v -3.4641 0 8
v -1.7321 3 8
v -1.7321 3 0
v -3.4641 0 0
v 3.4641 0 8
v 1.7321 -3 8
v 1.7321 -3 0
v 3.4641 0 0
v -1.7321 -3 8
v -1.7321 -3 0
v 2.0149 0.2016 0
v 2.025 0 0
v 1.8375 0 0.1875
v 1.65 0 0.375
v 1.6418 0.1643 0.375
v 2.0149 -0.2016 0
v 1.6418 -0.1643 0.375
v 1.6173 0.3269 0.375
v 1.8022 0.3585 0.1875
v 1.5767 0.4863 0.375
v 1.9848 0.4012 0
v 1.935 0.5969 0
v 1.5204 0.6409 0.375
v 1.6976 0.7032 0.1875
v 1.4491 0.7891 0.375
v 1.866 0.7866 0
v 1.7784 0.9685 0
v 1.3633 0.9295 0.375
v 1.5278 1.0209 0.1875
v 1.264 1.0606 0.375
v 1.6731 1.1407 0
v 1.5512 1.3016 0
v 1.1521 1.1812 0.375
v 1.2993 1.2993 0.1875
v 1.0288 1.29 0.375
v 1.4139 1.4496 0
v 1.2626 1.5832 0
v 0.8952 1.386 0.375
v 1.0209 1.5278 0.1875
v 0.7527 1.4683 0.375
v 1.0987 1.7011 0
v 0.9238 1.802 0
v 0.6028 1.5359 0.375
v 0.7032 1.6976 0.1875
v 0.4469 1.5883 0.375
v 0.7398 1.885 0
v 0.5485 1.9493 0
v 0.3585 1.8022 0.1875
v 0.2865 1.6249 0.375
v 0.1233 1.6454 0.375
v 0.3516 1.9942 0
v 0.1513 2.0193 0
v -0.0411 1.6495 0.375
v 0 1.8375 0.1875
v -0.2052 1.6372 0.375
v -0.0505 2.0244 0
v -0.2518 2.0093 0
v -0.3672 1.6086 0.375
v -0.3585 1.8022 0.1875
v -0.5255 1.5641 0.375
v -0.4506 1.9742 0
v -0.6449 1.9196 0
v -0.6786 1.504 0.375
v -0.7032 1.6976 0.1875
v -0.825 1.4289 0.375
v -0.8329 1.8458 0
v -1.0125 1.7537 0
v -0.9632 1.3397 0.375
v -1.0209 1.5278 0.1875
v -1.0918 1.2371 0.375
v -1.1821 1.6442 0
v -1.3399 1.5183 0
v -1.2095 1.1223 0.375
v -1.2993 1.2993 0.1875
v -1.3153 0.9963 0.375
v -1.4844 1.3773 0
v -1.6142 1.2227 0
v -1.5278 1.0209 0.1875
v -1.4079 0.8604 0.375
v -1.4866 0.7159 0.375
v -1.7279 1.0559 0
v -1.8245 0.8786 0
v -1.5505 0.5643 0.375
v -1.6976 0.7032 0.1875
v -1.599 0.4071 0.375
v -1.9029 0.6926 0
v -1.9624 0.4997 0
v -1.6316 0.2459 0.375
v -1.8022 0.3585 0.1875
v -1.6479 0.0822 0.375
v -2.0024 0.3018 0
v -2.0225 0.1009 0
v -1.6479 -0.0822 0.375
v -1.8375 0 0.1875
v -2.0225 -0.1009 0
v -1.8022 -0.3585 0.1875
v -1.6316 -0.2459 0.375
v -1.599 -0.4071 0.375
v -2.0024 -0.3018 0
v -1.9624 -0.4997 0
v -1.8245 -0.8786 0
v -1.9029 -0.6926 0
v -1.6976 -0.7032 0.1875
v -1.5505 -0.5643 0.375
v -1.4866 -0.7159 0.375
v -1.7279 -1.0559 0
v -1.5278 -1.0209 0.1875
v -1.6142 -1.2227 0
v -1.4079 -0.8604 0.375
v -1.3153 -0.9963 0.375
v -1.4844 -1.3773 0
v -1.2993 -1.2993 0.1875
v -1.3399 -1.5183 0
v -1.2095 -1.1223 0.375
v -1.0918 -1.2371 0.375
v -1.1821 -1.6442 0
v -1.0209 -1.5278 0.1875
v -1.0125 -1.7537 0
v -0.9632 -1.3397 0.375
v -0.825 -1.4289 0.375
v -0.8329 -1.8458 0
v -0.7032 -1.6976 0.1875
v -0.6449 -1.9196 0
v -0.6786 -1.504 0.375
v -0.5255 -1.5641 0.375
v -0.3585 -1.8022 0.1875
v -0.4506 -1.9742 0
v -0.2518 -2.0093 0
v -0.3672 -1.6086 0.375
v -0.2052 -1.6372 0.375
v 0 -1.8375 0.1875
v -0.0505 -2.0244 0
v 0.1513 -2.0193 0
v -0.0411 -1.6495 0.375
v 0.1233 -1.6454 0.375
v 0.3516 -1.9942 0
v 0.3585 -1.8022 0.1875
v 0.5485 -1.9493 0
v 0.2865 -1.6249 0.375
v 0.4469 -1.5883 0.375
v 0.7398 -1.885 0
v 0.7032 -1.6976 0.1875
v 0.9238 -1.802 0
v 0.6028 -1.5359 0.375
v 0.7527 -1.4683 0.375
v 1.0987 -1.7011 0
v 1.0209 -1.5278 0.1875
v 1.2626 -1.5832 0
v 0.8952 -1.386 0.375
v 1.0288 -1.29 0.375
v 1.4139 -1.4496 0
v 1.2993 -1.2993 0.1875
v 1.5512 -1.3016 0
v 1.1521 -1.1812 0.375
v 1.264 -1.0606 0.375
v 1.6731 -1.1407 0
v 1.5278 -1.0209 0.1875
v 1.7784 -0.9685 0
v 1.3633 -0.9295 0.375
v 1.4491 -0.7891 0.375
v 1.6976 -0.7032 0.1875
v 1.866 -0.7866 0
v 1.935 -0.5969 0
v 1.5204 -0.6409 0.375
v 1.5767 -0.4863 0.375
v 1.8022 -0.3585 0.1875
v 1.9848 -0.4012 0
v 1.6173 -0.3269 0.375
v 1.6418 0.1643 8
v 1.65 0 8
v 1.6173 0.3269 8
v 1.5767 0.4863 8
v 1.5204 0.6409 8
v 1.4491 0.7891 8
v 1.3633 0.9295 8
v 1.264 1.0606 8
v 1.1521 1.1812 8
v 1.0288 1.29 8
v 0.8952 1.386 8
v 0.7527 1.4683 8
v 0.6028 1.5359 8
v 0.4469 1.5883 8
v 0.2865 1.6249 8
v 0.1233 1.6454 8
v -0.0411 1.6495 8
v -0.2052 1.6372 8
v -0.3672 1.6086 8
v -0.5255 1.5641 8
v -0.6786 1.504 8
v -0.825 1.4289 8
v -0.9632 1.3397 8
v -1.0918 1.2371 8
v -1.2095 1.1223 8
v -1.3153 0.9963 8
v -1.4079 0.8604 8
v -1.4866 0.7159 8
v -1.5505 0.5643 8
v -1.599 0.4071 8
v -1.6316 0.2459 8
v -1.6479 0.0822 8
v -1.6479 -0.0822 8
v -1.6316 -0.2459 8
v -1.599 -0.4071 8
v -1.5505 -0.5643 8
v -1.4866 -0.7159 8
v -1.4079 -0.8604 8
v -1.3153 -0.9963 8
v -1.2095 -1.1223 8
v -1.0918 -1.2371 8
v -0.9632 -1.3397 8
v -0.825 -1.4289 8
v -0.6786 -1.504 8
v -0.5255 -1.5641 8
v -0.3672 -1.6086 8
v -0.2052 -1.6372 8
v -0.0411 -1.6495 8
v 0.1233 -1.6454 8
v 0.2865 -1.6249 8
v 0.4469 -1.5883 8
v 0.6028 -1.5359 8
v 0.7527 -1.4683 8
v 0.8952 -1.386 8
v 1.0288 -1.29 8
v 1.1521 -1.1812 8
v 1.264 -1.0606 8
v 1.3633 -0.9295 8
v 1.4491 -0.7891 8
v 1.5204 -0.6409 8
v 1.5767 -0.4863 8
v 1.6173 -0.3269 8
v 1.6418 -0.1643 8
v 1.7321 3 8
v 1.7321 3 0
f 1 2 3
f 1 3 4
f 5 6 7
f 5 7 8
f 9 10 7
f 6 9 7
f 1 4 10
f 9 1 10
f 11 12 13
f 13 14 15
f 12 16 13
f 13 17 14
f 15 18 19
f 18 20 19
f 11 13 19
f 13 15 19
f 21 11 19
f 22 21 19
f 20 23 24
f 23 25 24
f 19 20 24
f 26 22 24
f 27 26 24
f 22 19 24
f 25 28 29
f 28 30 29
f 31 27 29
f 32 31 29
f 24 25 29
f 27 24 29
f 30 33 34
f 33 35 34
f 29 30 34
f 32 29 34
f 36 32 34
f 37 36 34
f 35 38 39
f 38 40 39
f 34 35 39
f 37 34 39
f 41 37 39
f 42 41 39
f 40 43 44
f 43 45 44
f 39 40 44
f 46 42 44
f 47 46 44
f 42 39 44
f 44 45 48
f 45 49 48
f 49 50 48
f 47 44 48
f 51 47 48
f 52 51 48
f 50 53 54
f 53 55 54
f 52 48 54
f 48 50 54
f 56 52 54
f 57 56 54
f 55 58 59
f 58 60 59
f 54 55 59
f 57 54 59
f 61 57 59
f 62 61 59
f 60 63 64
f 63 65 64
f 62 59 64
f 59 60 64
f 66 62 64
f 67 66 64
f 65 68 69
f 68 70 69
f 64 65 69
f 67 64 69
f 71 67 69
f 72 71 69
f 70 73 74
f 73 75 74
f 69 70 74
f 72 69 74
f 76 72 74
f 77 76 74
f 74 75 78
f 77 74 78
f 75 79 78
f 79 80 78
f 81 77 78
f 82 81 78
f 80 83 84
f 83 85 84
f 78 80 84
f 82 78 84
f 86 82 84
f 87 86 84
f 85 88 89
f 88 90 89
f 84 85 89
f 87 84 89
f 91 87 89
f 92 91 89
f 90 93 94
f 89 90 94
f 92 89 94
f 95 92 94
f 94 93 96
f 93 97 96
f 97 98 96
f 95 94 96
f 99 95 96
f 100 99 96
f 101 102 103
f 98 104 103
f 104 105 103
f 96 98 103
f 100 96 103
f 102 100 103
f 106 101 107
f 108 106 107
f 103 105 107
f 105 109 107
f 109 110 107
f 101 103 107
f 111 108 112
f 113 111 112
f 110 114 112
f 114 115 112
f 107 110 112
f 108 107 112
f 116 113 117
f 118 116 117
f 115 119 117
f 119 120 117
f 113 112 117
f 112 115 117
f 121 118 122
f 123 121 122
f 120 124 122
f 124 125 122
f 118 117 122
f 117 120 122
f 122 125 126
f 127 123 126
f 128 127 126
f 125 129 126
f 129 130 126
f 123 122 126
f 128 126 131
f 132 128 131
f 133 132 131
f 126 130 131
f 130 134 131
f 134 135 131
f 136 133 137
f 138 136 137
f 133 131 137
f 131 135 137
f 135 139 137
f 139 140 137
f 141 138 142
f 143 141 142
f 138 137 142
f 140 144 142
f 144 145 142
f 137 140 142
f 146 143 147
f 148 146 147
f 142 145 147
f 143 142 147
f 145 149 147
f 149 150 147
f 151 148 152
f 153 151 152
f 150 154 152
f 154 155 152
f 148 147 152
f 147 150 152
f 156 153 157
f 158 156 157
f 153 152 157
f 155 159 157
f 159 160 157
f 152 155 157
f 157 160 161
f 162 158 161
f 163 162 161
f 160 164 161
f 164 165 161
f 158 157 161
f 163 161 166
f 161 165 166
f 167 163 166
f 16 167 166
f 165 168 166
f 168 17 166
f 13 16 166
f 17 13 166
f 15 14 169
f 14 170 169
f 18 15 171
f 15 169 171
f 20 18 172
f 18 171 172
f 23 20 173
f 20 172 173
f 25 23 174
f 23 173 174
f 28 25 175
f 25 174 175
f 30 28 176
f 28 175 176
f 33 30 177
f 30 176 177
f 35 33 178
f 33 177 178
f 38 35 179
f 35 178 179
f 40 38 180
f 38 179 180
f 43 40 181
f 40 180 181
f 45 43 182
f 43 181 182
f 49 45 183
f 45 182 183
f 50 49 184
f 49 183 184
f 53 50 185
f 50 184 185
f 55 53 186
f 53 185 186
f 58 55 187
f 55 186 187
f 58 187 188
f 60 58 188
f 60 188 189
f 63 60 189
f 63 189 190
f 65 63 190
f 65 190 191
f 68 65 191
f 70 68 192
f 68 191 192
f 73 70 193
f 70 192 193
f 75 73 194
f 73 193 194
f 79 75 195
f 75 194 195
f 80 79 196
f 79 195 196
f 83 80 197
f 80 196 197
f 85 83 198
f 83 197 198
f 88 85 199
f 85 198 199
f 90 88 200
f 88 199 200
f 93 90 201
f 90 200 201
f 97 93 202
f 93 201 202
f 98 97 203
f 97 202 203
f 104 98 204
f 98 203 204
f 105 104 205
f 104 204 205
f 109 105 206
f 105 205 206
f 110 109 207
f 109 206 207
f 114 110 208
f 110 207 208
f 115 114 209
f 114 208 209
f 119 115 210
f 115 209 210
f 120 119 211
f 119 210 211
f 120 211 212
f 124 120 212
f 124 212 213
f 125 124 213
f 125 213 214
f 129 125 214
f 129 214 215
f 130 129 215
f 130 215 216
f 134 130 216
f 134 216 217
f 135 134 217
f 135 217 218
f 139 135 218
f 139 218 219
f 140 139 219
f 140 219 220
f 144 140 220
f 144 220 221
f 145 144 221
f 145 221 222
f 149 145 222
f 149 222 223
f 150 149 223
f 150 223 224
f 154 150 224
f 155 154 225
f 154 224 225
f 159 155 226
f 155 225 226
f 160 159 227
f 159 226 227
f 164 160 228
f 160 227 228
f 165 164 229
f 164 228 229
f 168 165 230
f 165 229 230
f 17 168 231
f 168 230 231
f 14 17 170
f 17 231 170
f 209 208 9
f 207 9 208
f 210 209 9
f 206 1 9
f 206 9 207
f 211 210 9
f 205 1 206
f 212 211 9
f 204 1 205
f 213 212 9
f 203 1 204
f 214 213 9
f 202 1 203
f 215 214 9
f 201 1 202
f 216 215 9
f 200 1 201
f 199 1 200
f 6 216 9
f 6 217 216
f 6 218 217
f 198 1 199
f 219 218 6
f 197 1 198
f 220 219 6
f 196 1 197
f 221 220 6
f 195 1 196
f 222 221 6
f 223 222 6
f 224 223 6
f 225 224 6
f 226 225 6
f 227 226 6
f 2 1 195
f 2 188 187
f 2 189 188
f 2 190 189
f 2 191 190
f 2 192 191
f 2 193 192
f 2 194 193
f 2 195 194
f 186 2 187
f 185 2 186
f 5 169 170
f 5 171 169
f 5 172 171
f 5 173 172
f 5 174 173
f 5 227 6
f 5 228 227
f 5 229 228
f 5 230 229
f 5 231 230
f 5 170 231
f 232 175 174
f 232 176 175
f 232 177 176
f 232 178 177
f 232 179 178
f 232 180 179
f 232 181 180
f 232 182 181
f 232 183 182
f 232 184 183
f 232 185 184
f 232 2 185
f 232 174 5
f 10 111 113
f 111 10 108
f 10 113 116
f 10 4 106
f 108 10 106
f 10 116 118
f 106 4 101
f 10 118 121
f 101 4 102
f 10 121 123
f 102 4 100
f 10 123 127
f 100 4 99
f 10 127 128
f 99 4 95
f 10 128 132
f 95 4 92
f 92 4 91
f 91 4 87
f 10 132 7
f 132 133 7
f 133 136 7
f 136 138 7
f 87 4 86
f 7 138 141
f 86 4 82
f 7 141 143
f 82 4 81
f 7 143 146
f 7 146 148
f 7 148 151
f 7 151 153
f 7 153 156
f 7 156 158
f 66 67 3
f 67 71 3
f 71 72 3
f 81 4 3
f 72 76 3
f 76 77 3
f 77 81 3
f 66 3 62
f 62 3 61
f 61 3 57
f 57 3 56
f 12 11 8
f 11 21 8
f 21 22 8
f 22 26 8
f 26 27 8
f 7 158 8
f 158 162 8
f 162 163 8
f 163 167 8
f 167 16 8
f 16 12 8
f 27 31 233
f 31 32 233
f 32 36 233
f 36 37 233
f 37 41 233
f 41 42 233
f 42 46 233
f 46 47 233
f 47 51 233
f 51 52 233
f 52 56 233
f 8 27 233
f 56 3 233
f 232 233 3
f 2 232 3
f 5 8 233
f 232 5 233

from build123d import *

# Parameters (mm, degrees)
EXTRUDE_1_DEPTH              = 8
HOLE_WIZARD_M4_1_D           = 3.3
HOLE_WIZARD_M4_1_CSINK_D     = 4.05
HOLE_WIZARD_M4_1_CSINK_ANGLE = 90


with BuildPart() as part:
    # 草图1 → 凸台-拉伸1 (new body)
    with BuildSketch(Plane.XY):
        Polygon((3.464101615, 0), (1.732050808, 3), (-1.732050808, 3), (-3.464101615, 0), (-1.732050808, -3), (1.732050808, -3), align=None)
    extrude(amount=EXTRUDE_1_DEPTH)

    # M4 螺纹孔1 (through all)
    with Locations(Plane(origin=(0, 0, 0), x_dir=(-1, 0, 0), z_dir=(0, 0, -1))):
        with Locations((0, 0)):
            CounterSinkHole(HOLE_WIZARD_M4_1_D / 2, HOLE_WIZARD_M4_1_CSINK_D / 2, counter_sink_angle=HOLE_WIZARD_M4_1_CSINK_ANGLE)


solid = part.part
